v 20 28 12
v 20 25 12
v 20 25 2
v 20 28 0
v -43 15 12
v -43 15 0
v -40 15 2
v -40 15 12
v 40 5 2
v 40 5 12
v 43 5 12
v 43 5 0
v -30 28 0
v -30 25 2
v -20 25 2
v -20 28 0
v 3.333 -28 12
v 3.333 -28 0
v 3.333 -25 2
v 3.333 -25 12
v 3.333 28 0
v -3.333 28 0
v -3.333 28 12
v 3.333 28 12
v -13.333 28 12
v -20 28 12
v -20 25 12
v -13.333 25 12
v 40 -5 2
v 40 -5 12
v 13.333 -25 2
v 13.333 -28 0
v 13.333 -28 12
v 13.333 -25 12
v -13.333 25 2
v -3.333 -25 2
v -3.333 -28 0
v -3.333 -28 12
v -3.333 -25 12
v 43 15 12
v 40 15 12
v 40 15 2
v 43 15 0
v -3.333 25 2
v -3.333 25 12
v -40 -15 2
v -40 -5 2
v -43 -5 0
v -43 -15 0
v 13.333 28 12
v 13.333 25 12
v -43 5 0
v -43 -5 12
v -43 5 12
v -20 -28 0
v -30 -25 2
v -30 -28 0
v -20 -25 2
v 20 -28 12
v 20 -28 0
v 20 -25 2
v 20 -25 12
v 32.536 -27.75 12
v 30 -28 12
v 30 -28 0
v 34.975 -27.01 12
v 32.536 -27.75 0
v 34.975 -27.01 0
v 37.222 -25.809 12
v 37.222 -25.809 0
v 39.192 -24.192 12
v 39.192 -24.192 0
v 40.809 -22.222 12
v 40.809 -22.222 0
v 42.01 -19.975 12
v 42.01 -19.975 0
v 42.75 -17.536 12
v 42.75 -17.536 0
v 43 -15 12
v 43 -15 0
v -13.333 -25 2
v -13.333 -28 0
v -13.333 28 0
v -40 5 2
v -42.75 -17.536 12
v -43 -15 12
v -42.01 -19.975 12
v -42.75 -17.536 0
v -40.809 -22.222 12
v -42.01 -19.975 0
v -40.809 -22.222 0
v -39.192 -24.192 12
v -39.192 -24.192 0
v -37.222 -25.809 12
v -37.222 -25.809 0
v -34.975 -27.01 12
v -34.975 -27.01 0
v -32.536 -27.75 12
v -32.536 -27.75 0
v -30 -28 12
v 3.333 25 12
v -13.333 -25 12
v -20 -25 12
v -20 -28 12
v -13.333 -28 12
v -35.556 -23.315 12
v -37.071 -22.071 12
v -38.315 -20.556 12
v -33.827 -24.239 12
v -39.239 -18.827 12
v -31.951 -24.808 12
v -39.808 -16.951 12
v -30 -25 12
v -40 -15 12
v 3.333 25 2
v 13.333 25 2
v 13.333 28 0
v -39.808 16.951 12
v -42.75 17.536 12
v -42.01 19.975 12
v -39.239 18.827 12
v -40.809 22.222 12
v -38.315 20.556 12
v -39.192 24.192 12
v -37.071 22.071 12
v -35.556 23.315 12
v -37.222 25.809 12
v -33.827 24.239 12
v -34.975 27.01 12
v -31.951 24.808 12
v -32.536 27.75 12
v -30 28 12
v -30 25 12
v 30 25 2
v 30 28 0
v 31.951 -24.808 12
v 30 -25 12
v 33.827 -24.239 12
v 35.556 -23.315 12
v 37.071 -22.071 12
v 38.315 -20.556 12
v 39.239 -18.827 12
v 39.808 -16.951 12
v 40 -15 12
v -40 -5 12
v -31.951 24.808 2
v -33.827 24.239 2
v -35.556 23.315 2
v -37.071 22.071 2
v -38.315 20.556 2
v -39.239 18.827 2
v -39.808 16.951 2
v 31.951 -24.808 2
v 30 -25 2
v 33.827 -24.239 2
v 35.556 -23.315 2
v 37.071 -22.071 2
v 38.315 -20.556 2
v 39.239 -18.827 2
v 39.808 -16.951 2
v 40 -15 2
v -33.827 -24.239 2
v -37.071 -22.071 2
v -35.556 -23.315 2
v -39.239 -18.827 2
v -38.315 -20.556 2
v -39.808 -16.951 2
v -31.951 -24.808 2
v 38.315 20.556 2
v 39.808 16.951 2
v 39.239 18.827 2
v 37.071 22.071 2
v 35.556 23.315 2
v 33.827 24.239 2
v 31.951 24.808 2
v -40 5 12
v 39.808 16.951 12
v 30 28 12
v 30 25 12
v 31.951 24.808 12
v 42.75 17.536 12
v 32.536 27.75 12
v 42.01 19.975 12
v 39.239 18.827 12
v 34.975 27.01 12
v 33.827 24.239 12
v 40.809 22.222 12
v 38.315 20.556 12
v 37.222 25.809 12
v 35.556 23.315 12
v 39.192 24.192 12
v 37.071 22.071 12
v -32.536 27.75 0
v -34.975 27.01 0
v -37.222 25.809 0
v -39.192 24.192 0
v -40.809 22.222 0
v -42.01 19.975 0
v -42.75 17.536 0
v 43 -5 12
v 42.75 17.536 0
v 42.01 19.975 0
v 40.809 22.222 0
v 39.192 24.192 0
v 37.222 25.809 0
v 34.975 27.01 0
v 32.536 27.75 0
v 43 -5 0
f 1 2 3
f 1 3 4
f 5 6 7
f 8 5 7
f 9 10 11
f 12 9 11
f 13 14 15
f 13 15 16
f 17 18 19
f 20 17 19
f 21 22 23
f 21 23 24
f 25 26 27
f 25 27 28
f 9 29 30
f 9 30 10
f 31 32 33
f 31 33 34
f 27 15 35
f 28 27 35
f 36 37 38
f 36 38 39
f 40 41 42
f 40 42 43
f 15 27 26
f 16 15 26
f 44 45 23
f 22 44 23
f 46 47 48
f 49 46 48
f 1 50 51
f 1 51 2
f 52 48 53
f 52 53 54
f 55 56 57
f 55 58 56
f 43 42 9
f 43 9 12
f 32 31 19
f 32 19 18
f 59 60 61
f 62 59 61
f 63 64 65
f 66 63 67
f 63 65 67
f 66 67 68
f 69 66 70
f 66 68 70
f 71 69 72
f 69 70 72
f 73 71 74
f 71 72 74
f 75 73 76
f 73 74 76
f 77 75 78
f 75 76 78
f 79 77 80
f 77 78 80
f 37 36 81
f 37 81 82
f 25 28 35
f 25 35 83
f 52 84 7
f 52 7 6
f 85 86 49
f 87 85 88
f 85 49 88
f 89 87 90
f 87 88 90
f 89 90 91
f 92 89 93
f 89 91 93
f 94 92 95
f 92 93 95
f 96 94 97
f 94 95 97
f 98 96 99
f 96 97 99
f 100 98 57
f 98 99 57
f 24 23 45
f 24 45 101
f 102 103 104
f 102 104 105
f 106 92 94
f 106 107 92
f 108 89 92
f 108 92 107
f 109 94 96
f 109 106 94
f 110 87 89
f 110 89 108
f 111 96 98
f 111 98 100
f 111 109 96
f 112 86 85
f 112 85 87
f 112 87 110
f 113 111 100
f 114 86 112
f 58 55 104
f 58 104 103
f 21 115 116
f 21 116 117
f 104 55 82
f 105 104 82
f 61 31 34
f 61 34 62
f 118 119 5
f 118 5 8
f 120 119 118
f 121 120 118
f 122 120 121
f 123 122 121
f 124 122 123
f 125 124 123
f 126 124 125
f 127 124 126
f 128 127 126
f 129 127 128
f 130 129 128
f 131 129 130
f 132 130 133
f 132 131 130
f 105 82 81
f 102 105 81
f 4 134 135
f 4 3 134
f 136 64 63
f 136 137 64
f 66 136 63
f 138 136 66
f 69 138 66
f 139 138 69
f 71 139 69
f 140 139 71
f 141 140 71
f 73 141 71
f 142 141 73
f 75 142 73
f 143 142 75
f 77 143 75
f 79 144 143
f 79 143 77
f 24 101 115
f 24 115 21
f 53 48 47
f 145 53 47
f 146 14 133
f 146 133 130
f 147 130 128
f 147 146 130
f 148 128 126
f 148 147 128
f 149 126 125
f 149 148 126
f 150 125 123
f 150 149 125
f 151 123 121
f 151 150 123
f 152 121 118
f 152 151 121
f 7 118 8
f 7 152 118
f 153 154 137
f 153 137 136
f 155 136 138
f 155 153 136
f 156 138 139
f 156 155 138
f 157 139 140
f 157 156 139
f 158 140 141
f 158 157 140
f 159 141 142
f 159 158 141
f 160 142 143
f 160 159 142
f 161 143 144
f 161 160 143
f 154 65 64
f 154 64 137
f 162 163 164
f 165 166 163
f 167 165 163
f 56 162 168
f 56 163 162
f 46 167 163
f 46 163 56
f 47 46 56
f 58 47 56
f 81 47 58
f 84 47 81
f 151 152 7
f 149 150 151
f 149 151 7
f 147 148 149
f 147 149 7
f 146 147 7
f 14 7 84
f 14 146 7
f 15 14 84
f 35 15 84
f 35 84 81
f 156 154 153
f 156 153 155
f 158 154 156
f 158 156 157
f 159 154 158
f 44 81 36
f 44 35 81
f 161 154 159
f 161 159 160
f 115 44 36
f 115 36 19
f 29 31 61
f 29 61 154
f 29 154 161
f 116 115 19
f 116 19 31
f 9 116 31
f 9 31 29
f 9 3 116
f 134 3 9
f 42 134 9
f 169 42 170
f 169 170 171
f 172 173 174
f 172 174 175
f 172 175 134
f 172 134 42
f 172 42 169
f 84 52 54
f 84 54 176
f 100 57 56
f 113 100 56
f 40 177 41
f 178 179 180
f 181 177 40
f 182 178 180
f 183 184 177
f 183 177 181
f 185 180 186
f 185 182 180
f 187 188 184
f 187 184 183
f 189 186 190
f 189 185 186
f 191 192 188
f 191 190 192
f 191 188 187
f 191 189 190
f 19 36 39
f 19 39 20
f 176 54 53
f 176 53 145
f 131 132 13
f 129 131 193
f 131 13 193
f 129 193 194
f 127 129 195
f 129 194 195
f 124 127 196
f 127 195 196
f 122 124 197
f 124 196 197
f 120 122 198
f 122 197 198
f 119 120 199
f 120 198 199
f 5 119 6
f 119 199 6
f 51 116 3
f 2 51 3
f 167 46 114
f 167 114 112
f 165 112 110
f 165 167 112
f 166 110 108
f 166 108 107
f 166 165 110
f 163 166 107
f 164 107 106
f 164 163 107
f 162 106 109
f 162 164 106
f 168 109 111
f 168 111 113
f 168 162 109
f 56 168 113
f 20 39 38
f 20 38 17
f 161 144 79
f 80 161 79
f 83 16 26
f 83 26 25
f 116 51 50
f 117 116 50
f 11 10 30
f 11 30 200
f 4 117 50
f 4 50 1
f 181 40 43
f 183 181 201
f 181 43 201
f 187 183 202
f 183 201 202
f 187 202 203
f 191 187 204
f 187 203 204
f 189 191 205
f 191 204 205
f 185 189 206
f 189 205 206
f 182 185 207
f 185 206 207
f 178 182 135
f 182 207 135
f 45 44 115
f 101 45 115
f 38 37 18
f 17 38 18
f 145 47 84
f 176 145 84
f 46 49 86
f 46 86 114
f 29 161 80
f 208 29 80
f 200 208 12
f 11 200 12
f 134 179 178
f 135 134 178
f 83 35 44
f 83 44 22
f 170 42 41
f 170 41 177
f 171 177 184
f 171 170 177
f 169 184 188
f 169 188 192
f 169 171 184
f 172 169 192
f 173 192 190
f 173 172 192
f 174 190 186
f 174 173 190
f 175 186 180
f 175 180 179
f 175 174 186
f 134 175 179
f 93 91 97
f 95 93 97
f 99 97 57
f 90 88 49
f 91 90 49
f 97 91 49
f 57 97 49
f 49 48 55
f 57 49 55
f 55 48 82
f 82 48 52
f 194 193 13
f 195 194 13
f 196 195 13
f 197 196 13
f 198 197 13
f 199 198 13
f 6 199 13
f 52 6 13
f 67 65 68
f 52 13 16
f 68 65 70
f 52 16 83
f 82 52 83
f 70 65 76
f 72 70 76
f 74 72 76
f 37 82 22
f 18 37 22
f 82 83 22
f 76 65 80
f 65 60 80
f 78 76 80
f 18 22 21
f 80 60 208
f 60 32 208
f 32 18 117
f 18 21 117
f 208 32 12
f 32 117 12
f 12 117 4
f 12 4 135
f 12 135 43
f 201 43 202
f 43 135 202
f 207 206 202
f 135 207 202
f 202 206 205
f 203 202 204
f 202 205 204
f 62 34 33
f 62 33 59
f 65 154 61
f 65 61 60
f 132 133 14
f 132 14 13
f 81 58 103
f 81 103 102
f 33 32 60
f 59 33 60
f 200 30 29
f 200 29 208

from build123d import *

# Parameters (mm, degrees)
PAD_DEPTH     = 2
SKETCH003_W   = 6.666667
SKETCH003_H   = 3
SKETCH003_W_2 = 6.666666
SKETCH003_W_3 = 3
SKETCH003_H_2 = 10
PAD001_DEPTH  = 12


with BuildPart() as part:
    # AdditivePipe: sweep along a path in Sketch
    with BuildLine(Plane.XY) as additivepipe_path:
        Line((-40, 15), (-40, -15))
        ThreePointArc((-40, -15), (-37.071068, -22.071068), (-30, -25))
        Line((-30, -25), (30, -25))
        ThreePointArc((30, -25), (37.071068, -22.071068), (40, -15))
        Line((40, -15), (40, 15))
        ThreePointArc((40, 15), (37.071068, 22.071068), (30, 25))
        Line((30, 25), (-30, 25))
        ThreePointArc((-30, 25), (-37.071068, 22.071068), (-40, 15))
    # Sketch002 → AdditivePipe (sweep)
    with BuildSketch(Plane.YZ):
        Polygon((-25, 0), (-28, 0), (-25, 2), align=None)
    sweep(path=additivepipe_path.line)

    # Sketch001 → Pad (new body)
    with BuildSketch(Plane.XY):
        with BuildLine():
            Line((-40, 15), (-40, -15))
            ThreePointArc((-40, -15), (-37.071068, -22.071068), (-30, -25))
            Line((-30, -25), (30, -25))
            ThreePointArc((30, -25), (37.071068, -22.071068), (40, -15))
            Line((40, -15), (40, 15))
            ThreePointArc((40, 15), (37.071068, 22.071068), (30, 25))
            Line((30, 25), (-30, 25))
            ThreePointArc((-30, 25), (-37.071068, 22.071068), (-40, 15))
        make_face()
    extrude(amount=PAD_DEPTH)

    # Sketch003 → Pad001 (join)
    with BuildSketch(Plane.XY):
        with BuildLine():
            ThreePointArc((-30, 28), (-39.192388, 24.192388), (-43, 15))
            Line((-43, 15), (-40, 15))
            ThreePointArc((-30, 25), (-37.071068, 22.071068), (-40, 15))
            Line((-30, 25), (-30, 28))
        make_face()
        with BuildLine():
            ThreePointArc((-43, -15), (-39.192388, -24.192388), (-30, -28))
            Line((-30, -28), (-30, -25))
            ThreePointArc((-40, -15), (-37.071068, -22.071068), (-30, -25))
            Line((-43, -15), (-40, -15))
        make_face()
        with BuildLine():
            ThreePointArc((30, -28), (39.192388, -24.192388), (43, -15))
            Line((40, -15), (43, -15))
            ThreePointArc((30, -25), (37.071068, -22.071068), (40, -15))
            Line((30, -28), (30, -25))
        make_face()
        with BuildLine():
            ThreePointArc((43, 15), (39.192388, 24.192388), (30, 28))
            Line((30, 25), (30, 28))
            ThreePointArc((40, 15), (37.071068, 22.071068), (30, 25))
            Line((40, 15), (43, 15))
        make_face()
        with Locations((16.666666, 26.5)):
            Rectangle(SKETCH003_W, SKETCH003_H)
        with Locations((0, 26.5)):
            Rectangle(SKETCH003_W_2, SKETCH003_H)
        with Locations((-16.666666, 26.5)):
            Rectangle(SKETCH003_W, SKETCH003_H)
        with Locations((-16.666666, -26.5)):
            Rectangle(SKETCH003_W, SKETCH003_H)
        with Locations((0, -26.5)):
            Rectangle(SKETCH003_W_2, SKETCH003_H)
        with Locations((16.666666, -26.5)):
            Rectangle(SKETCH003_W, SKETCH003_H)
        with Locations((-41.5, 0)):
            Rectangle(SKETCH003_W_3, SKETCH003_H_2)
        with Locations((41.5, 0)):
            Rectangle(SKETCH003_W_3, SKETCH003_H_2)
    extrude(amount=PAD001_DEPTH)


solid = part.part
